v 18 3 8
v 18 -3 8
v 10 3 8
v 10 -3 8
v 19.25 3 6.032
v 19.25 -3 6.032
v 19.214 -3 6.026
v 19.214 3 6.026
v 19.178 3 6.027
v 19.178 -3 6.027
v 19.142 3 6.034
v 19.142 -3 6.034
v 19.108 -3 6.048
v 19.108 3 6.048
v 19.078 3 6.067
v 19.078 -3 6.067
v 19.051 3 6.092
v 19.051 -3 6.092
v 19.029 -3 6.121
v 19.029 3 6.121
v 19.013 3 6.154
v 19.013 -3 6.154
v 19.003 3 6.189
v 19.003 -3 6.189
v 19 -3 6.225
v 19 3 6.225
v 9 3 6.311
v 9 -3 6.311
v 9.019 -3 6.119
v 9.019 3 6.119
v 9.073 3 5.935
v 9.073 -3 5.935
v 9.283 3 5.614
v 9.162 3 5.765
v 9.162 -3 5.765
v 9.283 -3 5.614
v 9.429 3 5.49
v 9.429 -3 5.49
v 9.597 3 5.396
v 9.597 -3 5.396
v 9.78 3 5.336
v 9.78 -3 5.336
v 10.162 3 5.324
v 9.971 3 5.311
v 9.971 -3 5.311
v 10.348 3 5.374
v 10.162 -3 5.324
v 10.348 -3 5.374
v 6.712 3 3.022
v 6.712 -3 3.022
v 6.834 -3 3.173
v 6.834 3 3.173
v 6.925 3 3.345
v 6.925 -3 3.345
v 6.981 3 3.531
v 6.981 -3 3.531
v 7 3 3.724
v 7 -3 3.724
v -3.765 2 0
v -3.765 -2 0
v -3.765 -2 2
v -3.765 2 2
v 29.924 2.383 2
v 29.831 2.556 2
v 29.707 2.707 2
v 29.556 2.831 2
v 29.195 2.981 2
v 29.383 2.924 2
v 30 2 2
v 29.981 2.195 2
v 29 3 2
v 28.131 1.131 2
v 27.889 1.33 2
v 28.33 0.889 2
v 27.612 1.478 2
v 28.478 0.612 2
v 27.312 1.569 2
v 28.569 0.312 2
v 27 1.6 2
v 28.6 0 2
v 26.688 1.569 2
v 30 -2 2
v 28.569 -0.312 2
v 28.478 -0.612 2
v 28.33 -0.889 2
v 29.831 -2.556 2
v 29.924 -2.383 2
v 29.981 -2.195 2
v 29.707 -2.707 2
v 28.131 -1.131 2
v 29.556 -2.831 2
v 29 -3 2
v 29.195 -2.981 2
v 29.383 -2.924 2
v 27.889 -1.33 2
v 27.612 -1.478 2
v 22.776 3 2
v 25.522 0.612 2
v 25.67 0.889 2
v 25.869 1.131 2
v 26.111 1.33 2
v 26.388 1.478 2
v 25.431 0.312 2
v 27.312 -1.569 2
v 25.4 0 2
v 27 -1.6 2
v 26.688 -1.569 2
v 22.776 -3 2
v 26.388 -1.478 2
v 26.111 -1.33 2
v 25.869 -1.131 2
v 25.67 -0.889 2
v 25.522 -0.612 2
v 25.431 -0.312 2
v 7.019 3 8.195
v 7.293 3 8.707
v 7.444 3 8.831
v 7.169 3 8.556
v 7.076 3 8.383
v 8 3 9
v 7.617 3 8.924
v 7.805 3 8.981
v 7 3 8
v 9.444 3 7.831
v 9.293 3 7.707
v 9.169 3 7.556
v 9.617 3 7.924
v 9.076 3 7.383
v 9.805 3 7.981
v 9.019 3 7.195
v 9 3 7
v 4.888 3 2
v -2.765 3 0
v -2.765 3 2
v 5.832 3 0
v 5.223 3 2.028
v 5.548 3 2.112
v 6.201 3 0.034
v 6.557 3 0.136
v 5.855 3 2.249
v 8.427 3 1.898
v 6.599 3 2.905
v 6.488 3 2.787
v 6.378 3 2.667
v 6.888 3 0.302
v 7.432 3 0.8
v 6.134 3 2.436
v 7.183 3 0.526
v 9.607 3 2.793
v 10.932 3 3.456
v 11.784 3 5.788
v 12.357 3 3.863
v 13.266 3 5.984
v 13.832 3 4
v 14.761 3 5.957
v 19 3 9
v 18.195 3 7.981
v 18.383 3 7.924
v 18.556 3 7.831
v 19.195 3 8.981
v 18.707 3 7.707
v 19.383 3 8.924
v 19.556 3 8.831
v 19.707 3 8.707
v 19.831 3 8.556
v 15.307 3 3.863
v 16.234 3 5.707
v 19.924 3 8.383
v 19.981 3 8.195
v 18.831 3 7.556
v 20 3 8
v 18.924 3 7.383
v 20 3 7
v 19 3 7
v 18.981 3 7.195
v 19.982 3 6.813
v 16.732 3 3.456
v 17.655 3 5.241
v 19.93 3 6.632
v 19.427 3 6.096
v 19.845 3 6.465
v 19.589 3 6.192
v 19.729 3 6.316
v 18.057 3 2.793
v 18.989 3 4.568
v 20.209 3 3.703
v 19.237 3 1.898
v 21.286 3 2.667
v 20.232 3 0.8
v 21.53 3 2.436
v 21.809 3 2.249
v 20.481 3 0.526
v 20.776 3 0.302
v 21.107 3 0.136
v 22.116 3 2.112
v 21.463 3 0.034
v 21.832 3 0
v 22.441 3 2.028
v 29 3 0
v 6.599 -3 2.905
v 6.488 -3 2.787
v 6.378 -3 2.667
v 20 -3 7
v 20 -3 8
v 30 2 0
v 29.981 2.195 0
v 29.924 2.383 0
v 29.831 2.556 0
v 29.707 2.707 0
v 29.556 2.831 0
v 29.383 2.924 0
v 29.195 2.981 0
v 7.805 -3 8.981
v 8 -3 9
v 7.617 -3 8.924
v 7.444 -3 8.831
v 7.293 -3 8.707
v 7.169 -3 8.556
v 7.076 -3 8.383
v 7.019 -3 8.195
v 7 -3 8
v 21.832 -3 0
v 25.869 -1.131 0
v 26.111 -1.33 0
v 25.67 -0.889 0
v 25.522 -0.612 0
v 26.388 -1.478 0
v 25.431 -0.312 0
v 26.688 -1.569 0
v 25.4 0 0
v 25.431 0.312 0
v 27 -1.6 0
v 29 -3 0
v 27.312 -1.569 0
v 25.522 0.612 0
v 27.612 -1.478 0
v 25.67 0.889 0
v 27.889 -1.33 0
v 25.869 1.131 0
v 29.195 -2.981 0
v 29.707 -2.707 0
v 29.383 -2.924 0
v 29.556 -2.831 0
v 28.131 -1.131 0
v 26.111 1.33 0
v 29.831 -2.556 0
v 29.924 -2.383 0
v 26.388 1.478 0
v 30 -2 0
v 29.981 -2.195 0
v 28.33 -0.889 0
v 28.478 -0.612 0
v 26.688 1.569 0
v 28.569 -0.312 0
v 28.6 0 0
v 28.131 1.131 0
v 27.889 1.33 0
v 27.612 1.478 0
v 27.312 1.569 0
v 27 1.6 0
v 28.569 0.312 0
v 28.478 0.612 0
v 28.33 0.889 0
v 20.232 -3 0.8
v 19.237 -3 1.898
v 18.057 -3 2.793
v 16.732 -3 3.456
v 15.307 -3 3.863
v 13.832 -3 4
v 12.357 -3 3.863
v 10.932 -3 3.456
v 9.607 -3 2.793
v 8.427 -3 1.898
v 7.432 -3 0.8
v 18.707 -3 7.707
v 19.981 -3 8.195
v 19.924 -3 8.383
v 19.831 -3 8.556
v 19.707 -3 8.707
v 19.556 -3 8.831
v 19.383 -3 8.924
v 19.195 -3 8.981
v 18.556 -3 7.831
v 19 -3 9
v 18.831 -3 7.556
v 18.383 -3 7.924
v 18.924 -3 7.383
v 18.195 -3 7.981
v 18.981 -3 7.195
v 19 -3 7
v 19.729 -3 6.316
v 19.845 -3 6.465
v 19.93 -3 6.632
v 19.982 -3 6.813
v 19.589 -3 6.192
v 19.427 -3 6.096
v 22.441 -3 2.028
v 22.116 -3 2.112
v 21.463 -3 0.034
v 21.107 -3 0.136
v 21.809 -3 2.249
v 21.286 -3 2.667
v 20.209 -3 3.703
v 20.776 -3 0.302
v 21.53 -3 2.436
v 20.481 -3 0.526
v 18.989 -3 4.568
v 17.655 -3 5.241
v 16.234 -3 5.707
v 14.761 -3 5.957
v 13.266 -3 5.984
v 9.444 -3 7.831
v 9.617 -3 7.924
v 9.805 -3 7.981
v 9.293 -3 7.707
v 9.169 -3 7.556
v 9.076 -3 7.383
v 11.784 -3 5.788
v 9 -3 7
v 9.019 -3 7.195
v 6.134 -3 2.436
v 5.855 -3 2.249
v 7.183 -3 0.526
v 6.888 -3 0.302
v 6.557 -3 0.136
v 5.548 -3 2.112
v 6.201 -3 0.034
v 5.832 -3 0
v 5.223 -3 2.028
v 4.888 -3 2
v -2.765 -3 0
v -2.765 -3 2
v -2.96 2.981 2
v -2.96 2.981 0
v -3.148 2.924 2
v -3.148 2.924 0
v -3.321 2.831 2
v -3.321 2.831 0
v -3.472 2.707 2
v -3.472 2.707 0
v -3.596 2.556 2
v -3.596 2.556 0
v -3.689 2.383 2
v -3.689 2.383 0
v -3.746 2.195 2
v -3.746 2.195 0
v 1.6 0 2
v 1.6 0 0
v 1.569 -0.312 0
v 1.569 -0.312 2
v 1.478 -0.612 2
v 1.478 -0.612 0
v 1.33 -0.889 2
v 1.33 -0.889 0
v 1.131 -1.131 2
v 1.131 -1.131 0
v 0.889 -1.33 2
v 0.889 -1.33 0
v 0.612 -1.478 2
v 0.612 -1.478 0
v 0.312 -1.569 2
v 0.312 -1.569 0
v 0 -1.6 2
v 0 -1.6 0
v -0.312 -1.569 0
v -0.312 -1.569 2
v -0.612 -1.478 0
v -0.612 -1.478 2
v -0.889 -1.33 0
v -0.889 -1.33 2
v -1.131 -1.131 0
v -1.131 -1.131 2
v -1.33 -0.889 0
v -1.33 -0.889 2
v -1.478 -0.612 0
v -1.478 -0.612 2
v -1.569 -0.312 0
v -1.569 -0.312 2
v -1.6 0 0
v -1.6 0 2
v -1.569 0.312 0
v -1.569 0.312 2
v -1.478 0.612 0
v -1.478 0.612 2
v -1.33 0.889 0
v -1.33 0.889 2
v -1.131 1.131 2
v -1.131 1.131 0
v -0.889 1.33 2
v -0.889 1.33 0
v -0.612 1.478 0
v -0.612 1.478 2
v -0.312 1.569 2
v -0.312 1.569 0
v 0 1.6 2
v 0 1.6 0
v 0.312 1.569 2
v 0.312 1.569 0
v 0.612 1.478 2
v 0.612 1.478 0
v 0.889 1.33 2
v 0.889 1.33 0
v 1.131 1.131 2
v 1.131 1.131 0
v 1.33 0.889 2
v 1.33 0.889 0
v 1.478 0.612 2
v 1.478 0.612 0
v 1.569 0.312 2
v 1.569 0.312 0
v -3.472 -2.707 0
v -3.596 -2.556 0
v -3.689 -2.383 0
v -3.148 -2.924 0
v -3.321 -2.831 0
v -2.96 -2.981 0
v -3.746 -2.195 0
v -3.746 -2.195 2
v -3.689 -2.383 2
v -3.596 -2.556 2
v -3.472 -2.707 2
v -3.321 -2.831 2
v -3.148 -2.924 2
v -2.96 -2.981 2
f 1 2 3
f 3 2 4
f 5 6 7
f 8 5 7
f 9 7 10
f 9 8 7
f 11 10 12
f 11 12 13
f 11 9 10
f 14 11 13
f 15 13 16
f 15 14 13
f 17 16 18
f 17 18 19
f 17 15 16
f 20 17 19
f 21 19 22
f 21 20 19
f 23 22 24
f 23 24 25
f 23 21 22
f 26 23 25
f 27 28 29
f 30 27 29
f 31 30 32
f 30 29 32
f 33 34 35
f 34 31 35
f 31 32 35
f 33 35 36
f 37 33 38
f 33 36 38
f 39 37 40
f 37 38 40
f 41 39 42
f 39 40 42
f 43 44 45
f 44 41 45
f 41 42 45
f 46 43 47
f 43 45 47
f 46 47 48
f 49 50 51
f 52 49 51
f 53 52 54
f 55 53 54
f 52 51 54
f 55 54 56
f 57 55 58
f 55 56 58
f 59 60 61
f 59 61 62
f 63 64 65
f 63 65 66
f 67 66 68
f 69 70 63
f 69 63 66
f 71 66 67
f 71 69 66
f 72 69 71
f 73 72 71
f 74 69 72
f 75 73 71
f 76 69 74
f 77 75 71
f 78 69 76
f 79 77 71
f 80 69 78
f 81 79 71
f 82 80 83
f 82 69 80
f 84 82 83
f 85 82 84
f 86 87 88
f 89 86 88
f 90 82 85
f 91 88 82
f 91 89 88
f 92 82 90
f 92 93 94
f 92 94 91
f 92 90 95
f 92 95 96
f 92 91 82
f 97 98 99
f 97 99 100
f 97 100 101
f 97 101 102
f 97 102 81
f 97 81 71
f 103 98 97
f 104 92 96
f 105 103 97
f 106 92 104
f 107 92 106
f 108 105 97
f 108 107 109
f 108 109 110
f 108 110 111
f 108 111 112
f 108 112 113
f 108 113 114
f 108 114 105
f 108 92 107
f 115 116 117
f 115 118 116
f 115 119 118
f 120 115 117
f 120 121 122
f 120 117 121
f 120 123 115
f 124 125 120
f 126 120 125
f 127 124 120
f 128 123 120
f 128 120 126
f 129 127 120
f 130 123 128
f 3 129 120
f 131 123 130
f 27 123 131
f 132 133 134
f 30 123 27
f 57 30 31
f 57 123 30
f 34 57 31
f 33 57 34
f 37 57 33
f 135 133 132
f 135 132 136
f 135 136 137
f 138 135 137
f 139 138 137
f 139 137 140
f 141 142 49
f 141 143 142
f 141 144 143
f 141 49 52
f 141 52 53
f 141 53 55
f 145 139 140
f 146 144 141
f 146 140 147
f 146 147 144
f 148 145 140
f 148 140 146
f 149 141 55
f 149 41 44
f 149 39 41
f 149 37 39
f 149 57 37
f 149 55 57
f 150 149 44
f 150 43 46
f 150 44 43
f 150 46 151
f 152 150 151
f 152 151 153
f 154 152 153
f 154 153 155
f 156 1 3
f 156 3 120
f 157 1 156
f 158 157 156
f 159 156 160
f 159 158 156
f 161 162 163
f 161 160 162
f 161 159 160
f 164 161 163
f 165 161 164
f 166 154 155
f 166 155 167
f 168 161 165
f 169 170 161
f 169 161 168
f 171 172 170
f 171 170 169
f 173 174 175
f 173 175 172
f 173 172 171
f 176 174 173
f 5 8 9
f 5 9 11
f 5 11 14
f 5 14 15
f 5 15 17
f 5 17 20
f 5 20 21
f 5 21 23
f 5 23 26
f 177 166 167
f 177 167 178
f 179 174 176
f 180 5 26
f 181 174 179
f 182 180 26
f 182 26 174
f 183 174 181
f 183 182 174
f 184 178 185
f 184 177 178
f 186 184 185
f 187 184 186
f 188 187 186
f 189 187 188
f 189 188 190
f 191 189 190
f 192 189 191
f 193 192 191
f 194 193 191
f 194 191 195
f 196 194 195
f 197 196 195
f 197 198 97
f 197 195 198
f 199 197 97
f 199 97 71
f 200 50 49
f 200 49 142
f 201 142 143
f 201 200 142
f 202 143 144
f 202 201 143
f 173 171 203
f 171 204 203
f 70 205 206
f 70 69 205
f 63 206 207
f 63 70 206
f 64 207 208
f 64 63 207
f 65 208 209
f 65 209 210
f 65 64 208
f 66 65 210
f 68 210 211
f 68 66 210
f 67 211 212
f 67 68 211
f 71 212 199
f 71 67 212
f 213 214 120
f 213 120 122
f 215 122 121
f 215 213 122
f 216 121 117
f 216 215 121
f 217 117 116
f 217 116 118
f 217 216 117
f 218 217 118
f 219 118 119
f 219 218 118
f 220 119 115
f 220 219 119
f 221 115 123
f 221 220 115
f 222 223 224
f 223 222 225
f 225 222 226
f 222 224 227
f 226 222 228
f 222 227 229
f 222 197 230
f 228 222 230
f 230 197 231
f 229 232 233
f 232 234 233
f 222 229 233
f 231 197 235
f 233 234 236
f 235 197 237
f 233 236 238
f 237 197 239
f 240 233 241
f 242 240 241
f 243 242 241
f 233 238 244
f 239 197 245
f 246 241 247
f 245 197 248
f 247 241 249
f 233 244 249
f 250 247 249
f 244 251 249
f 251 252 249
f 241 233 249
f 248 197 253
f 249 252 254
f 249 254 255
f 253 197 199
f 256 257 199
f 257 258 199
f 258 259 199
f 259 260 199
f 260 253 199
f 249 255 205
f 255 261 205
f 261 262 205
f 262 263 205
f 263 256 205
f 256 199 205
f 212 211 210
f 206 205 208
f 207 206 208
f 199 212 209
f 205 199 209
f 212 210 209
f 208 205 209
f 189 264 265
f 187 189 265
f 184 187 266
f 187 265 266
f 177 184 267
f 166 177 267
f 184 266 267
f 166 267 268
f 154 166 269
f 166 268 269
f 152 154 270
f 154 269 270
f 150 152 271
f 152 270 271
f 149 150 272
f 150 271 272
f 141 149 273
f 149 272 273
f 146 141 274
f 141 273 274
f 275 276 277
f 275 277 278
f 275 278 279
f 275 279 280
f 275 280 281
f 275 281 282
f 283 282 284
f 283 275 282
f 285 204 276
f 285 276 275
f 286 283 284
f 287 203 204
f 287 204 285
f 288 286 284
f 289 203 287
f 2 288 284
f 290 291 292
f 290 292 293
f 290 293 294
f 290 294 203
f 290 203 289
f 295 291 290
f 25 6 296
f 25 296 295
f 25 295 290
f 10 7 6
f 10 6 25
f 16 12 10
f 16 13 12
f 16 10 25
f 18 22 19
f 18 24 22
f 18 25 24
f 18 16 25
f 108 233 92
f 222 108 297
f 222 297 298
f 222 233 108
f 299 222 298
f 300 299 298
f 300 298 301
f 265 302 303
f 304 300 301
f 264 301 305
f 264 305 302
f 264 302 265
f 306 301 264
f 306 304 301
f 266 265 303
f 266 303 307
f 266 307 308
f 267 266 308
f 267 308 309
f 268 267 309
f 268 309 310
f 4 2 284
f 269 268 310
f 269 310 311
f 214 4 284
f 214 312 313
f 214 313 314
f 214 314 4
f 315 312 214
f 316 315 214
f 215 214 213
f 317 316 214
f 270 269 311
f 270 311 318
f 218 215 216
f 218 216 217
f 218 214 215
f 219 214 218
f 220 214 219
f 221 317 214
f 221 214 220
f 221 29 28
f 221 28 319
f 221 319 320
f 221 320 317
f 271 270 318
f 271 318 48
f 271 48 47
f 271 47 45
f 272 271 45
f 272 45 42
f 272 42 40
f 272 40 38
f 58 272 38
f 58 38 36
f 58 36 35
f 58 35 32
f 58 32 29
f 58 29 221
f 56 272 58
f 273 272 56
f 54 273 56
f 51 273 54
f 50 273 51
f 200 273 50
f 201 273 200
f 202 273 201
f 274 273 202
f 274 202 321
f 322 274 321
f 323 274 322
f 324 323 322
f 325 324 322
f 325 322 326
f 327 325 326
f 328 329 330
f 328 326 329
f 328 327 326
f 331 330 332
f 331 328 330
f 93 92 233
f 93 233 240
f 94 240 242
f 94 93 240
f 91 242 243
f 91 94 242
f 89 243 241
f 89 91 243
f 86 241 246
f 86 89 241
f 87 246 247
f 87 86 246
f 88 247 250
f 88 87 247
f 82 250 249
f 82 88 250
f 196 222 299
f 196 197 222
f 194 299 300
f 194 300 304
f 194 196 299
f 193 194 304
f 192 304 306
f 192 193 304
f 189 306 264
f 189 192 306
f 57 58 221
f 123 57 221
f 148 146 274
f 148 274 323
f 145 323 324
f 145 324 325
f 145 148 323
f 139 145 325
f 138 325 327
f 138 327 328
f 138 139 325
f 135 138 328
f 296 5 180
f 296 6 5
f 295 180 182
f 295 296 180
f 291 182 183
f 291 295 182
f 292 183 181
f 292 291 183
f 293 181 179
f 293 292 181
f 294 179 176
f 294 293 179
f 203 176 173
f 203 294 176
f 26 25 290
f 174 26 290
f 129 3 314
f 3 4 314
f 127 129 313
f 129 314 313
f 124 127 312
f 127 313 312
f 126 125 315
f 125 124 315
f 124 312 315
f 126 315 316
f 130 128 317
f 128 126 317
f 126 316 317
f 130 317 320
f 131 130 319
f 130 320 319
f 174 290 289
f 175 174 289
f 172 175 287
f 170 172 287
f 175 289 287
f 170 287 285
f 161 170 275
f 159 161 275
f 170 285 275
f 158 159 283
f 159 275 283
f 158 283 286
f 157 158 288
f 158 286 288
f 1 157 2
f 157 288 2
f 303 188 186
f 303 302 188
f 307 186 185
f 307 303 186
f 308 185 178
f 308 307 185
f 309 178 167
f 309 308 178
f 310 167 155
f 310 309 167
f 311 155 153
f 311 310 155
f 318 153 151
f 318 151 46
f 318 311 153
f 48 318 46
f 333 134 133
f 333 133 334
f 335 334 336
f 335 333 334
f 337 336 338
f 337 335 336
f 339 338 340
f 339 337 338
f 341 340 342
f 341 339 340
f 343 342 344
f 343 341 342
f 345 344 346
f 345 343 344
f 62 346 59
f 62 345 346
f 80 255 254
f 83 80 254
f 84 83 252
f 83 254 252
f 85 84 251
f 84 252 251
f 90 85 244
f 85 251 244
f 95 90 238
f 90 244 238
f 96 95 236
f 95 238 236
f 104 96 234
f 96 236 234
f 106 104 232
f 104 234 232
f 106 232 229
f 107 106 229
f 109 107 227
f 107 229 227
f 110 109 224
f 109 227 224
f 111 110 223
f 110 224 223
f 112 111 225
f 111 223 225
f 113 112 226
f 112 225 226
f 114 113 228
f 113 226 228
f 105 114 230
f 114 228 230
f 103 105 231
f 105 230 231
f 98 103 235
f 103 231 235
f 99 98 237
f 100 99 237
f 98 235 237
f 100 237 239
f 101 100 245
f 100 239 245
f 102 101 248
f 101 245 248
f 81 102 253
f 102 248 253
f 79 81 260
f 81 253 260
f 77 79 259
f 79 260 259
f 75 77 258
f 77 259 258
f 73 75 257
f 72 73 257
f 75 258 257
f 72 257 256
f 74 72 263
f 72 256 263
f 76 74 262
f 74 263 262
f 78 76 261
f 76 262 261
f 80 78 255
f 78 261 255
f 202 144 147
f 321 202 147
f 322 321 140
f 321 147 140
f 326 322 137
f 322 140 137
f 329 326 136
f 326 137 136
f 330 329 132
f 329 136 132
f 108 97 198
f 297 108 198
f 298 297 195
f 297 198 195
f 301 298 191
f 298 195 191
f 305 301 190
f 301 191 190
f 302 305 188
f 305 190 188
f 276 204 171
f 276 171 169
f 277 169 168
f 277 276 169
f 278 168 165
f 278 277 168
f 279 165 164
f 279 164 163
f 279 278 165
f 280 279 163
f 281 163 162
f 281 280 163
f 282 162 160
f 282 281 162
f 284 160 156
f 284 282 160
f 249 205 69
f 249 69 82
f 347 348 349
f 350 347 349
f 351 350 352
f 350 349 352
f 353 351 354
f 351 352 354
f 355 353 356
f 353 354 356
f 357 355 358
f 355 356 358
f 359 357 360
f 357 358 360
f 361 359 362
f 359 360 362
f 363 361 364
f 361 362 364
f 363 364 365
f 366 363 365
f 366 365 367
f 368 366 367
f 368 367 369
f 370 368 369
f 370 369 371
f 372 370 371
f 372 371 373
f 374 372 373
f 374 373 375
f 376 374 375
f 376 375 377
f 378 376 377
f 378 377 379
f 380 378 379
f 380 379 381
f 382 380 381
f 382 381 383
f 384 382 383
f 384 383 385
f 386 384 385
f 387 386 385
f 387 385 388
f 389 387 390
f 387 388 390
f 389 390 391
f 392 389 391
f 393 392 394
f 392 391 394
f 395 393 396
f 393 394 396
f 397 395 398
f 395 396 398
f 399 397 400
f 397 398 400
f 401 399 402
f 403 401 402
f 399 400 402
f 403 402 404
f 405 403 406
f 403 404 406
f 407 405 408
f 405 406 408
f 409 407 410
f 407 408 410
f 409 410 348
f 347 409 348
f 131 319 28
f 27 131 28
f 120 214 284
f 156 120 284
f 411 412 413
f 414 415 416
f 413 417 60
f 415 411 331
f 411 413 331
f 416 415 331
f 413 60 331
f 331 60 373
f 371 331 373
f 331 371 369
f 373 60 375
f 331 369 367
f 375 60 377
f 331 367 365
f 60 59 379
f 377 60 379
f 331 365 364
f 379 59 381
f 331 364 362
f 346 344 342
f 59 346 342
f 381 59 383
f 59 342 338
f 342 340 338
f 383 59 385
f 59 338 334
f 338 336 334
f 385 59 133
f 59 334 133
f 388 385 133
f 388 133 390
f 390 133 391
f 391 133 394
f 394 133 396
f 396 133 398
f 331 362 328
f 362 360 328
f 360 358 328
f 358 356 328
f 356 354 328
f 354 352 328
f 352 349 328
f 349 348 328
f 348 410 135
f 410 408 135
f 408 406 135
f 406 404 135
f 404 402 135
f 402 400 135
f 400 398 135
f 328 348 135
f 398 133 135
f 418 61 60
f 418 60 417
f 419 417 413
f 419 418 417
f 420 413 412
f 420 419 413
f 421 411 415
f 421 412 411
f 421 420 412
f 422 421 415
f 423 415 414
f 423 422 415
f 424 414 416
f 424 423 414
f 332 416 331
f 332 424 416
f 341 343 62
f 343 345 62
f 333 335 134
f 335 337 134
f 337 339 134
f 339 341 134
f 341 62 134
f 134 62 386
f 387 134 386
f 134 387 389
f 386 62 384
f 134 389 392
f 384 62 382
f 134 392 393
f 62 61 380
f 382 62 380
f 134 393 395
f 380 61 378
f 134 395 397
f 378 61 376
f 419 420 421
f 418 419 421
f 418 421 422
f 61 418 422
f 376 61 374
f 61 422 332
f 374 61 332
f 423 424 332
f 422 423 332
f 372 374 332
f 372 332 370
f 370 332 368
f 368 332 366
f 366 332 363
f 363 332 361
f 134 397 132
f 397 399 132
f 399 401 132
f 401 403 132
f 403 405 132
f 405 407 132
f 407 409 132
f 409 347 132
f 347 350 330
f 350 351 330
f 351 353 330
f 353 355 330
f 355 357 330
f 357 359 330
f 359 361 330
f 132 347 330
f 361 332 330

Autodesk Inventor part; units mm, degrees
ref_plane "YZ Plane" through (0, 0, 0) normal (1, 0, 0) x (0, 1, 0)
ref_plane "XZ Plane" through (0, 0, 0) normal (0, 1, 0) x (-1, 0, 0)
ref_plane "XY Plane" through (0, 0, 0) normal (0, 0, 1) x (1, 0, 0)
sketch "Skizze1" plane through (0, 0, 0) normal (0, 0, 1) x (1, 0, 0)
  line L0 (30, 3) -> (30, -3)
  line L1 (30, -3) -> (-3.765, -3)
  line L2 (-3.765, -3) -> (-3.765, 3)
  line L3 (-3.765, 3) -> (30, 3)
  circle A0 centre (0, 0) radius 1.6
  circle A1 centre (0, 0) radius 1.6
  circle A2 centre (27, 0) radius 1.6
  circle A3 centre (27, 0) radius 1.6
  line L4 (21.832, 1.0001) -> (21.832, -3)
  line L5 (21.832, -3) -> (5.832, -3)
  line L6 (5.832, -3) -> (5.832, 1.0001)
  line L7 (5.832, 1.0001) -> (21.832, 1.0001)
  dimension "d0" = 6
extrude "Extrusion1" add sketch "Skizze1" along normal blind 7
sketch "Skizze2" plane through (-3.765, -3, 0) normal (0, -1, 0) x (1, 0, 0)
  line L0 (0, 0) -> (33.765, 0) projected
  line L1 (0, 0) -> (9.597, 0)
  line L2 (9.597, 0) -> (25.597, 0)
  line L3 (17.597, 0) -> (17.597, -4)
  circle A0 centre (17.597, -4) radius 8
  line L4 (0, 0) -> (0, 2)
  circle A1 centre (17.597, -4) radius 10
  line L5 (0, 2) -> (9.597, 2)
  line L6 (0, 0) -> (0, 7) projected
  line L7 (33.765, 0) -> (33.765, 2)
  line L8 (33.765, 0) -> (33.765, 7) projected
  line L9 (33.765, 2) -> (25.597, 2)
  line L10 (33.765, 7) -> (0, 7) projected
  line L11 (0, 7) -> (33.765, 7)
  line L12 (33.765, 7) -> (33.765, 0)
  line L13 (33.765, 0) -> (0, 0)
  line L14 (0, 0) -> (0, 7)
  point P0 (3.765, 0)
  point P1 (24.5252, 0)
  point P2 (10.6688, 0)
  point P3 (17.597, 7)
  point P4 (8.4318, 0)
  point P5 (26.7622, 0)
  dimension "d3" = 9.597
  dimension "d4" = 16
  dimension "d5" = 4
  dimension "d6" = 16
  dimension "d7" = 2
  dimension "d8" = 2
  dimension "d9" = 2
extrude "Extrusion2" cut sketch "Skizze2" against normal blind 7 contours L6 L10 L8 L9 A1 L5 | A0 L0 picked at (13.3479, 0.4966)
fillet "Rundung1" radius 2 4 edges at (5.832, 0, 2) (6.9038, 0, 0) (20.7602, 0, 0) (21.832, 0, 2)
fillet "Rundung2" radius 1 4 edges at (-3.765, -3, 1) (30, -3, 1) (30, 3, 1) (-3.765, 3, 1)
sketch "Skizze3" plane through (13.832, -3, -4) normal (0, -1, 0) x (1, 0, 0)
  line L0 (-13.832, 4) -> (-6.832, 4)
  line L1 (-15.432, 3) -> (-12.232, 3) projected
  line L2 (-6.832, 4) -> (-6.832, 13)
  line L3 (-6.832, 13) -> (6.168, 13)
  line L4 (6.168, 13) -> (6.168, 10)
  line L5 (6.168, 10) -> (5.168, 10)
  line L6 (5.168, 10) -> (5.168, 12)
  line L7 (5.168, 12) -> (-4.832, 12)
  line L8 (-4.832, 12) -> (-4.832, 8.7551)
  arc A0 (7.4536, 6.6667) -> (-7.4536, 6.6667) centre (0, 0) ccw projected
  arc A1 (7.4536, 6.6667) -> (-7.4536, 6.6667) centre (0, 0) ccw
  point P0 (-13.832, 4)
  point P1 (-12.232, 3)
  point P2 (-6.832, 7.3023)
  point P3 (9.1652, 4)
  point P4 (-9.1652, 4)
  dimension "d14" = 7
  dimension "d15" = 9
  dimension "d16" = 13
  dimension "d17" = 3
  dimension "d18" = 1
  dimension "d19" = 2
  dimension "d20" = 10
extrude "Extrusion3" add sketch "Skizze3" against normal up to surface (6 mm away)
fillet "Rundung3" radius 1 7 edges at (20, 0, 6) (20, 0, 9) (7, 0, 9) (19, 0, 8) (9, 0, 8) (9, 0, 4.7551) (7, 0, 3.3023)
fillet "Rundung4" radius 0.2 2 edges at (19.0001, 0, 6) (19, 0, 6)
properties part number "DribblerMotorKlemme"
